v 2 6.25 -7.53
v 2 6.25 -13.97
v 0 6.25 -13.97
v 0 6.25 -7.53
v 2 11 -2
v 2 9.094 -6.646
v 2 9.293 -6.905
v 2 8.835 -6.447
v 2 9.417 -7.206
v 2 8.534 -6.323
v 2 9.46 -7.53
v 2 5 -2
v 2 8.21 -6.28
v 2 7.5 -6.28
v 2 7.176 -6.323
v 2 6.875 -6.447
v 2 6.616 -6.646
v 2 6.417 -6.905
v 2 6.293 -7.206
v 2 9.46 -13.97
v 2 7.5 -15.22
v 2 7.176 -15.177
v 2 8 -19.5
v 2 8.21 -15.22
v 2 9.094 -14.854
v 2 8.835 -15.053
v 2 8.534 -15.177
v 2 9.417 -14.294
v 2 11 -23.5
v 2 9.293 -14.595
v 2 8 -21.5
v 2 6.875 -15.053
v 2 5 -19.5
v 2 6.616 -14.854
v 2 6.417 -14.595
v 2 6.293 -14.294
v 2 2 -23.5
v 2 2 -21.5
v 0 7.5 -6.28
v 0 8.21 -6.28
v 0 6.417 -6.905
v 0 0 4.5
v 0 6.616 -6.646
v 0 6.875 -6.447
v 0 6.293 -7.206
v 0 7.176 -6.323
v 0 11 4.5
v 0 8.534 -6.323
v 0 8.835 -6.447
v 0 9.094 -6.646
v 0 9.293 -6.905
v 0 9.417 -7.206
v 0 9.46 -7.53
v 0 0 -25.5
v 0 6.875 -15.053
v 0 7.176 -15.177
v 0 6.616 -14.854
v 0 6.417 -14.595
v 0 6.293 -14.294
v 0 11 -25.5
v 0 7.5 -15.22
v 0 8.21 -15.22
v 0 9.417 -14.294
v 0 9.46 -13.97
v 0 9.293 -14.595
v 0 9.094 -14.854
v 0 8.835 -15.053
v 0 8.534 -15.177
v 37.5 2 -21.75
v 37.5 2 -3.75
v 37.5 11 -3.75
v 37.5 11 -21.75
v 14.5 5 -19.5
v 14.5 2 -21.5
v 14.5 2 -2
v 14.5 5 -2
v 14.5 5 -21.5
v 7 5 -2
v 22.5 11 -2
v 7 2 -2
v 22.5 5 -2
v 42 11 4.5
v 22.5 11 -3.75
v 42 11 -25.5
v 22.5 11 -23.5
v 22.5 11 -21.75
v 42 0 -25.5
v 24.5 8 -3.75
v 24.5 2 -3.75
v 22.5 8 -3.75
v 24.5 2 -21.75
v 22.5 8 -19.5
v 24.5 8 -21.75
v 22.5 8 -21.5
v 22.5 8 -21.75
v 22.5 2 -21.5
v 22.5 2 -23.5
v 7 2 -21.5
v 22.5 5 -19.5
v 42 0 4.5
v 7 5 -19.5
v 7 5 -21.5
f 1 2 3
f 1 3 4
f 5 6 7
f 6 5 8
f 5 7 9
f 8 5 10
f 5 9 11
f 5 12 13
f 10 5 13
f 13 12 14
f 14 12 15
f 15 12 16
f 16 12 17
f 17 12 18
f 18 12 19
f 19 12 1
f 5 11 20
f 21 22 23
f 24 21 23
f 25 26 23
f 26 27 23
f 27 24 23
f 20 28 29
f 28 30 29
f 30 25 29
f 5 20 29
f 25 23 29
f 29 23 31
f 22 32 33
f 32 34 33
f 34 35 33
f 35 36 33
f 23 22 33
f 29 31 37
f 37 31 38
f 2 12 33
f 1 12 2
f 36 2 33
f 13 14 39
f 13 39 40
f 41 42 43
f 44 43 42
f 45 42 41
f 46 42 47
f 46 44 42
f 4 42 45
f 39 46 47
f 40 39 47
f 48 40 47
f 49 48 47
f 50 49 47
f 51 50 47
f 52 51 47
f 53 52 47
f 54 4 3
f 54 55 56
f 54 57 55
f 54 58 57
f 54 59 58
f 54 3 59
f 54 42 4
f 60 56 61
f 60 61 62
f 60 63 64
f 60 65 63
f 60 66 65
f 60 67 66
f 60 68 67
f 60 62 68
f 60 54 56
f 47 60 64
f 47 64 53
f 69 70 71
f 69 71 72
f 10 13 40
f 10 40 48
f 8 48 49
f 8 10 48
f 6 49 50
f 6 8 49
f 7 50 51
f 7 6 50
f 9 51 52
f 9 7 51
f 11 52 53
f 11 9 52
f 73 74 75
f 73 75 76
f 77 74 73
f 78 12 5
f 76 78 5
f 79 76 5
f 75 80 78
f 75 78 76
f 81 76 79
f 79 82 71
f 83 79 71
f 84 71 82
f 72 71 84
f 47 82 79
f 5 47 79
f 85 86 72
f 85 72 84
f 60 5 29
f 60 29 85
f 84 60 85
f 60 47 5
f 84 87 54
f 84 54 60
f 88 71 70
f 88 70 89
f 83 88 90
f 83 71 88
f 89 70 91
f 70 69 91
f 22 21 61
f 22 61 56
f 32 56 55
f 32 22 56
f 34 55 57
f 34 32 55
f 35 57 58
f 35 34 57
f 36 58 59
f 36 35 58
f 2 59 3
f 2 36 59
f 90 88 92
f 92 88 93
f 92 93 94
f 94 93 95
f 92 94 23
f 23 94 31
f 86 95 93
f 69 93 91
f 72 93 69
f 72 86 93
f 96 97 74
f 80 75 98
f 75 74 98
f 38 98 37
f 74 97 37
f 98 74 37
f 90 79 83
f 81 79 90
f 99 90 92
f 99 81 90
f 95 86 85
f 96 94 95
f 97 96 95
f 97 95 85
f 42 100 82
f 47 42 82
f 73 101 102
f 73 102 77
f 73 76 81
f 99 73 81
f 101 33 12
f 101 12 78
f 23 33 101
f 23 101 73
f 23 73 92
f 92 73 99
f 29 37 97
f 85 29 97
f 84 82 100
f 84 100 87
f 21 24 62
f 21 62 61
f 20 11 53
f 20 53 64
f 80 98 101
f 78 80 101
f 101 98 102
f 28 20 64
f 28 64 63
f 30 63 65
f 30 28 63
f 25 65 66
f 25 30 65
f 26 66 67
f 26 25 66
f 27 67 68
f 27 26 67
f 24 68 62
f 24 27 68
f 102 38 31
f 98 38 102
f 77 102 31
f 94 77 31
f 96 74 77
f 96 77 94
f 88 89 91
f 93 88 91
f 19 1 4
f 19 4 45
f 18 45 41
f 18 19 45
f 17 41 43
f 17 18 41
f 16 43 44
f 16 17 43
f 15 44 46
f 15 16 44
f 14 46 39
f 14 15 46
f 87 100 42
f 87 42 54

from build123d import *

# Parameters (mm, degrees)
BOSS_EXTRUDE1_DEPTH = 2
SKETCH2_W           = 20.5
SKETCH2_H           = 2
SKETCH2_W_2         = 13
SKETCH2_H_2         = 18
SKETCH2_H_3         = 17.5
BOSS_EXTRUDE2_DEPTH = 9
SKETCH3_W           = 5
SKETCH3_H           = 3
SKETCH3_W_2         = 8
BOSS_EXTRUDE4_DEPTH = 17.5
SKETCH6_W           = 7.5
SKETCH6_H           = 3
CUT_EXTRUDE1_DEPTH  = 2.5
CUT_EXTRUDE3_DEPTH  = 3
SKETCH11_W          = 15
SKETCH11_H          = 11
BOSS_EXTRUDE5_DEPTH = 1.75
SKETCH12_W          = 15
SKETCH12_H          = 11
BOSS_EXTRUDE6_DEPTH = 1.75
CUT_EXTRUDE4_DEPTH  = 2
SKETCH14_W          = 39.5
SKETCH14_H          = 11
BOSS_EXTRUDE7_DEPTH = 4.5
SKETCH16_W          = 30
SKETCH16_H          = 11
BOSS_EXTRUDE8_DEPTH = 2.5


with BuildPart() as part:
    # Sketch1 → Boss-Extrude1 (new body)
    with BuildSketch(Plane(origin=(0, 0, 0), x_dir=(1, 0, 0), z_dir=(0, 1, 0))):
        Polygon((0, 25.5), (24.5, 25.5), (24.5, 23.75), (39.5, 23.75), (39.5, 1.75), (24.5, 1.75), (24.5, 0), (0, 0), align=None)
    extrude(amount=BOSS_EXTRUDE1_DEPTH)

    # Sketch2 → Boss-Extrude2 (add)
    with BuildSketch(Plane(origin=(0, 2, 0), x_dir=(1, 0, 0), z_dir=(0, 1, 0))):
        Polygon((24.5, 23.75), (24.5, 25.5), (0, 25.5), (0, 0), (24.5, 0), (24.5, 1.75), (39.5, 1.75), (39.5, 23.75), align=None)
        with Locations((12.25, 22.5)):
            Rectangle(SKETCH2_W, SKETCH2_H, mode=Mode.SUBTRACT)
        with Locations((31, 12.75)):
            Rectangle(SKETCH2_W_2, SKETCH2_H_2, mode=Mode.SUBTRACT)
        with Locations((12.25, 10.75)):
            Rectangle(SKETCH2_W, SKETCH2_H_3, mode=Mode.SUBTRACT)
    extrude(amount=BOSS_EXTRUDE2_DEPTH)

    # Sketch3 → Boss-Extrude4 (add)
    with BuildSketch(Plane.XY.offset(-19.5)):
        with Locations((4.5, 3.5)):
            Rectangle(SKETCH3_W, SKETCH3_H)
        with Locations((18.5, 3.5)):
            Rectangle(SKETCH3_W_2, SKETCH3_H)
    extrude(amount=BOSS_EXTRUDE4_DEPTH)

    # Sketch6 → Cut-Extrude1 (cut)
    with BuildSketch(Plane.XY.offset(-19.5)):
        with Locations((10.75, 3.5)):
            Rectangle(SKETCH6_W, SKETCH6_H)
    extrude(amount=-CUT_EXTRUDE1_DEPTH, mode=Mode.SUBTRACT)

    # Sketch7 → Cut-Extrude3 (cut)
    with BuildSketch(Plane(origin=(0, 11, 0), x_dir=(1, 0, 0), z_dir=(0, 1, 0))):
        Polygon((24.5, 3.75), (22.5, 3.75), (22.5, 19.5), (2, 19.5), (2, 21.5), (22.5, 21.5), (22.5, 21.75), (24.5, 21.75), (24.5, 21.5), (24.5, 19.5), align=None)
    extrude(amount=-CUT_EXTRUDE3_DEPTH, mode=Mode.SUBTRACT)

    # Sketch11 → Boss-Extrude5 (add)
    with BuildSketch(Plane.XY.offset(-1.75)):
        with Locations((32, 5.5)):
            Rectangle(SKETCH11_W, SKETCH11_H)
    extrude(amount=BOSS_EXTRUDE5_DEPTH)

    # Sketch12 → Boss-Extrude6 (add)
    with BuildSketch(Plane(origin=(0, 0, -23.75), x_dir=(-1, 0, 0), z_dir=(0, 0, -1))):
        with Locations((-32, 5.5)):
            Rectangle(SKETCH12_W, SKETCH12_H)
    extrude(amount=BOSS_EXTRUDE6_DEPTH)

    # Sketch13 → Cut-Extrude4 (cut)
    with BuildSketch(Plane(origin=(2, 0, 0), x_dir=(0, 0, -1), z_dir=(1, 0, 0))):
        with BuildLine():
            Line((6.28, 7.5), (6.28, 8.21))
            ThreePointArc((6.28, 8.21), (6.646116524, 9.093883476), (7.53, 9.46))
            Line((7.53, 9.46), (13.97, 9.46))
            ThreePointArc((13.97, 9.46), (14.853883476, 9.093883476), (15.22, 8.21))
            Line((15.22, 8.21), (15.22, 7.5))
            ThreePointArc((15.22, 7.5), (14.853883476, 6.616116524), (13.97, 6.25))
            Line((13.97, 6.25), (7.53, 6.25))
            ThreePointArc((7.53, 6.25), (6.646116524, 6.616116524), (6.28, 7.5))
        make_face()
    extrude(amount=-CUT_EXTRUDE4_DEPTH, mode=Mode.SUBTRACT)

    # Sketch14 → Boss-Extrude7 (add)
    with BuildSketch(Plane.XY):
        with Locations((19.75, 5.5)):
            Rectangle(SKETCH14_W, SKETCH14_H)
    extrude(amount=BOSS_EXTRUDE7_DEPTH)

    # Sketch16 → Boss-Extrude8 (add)
    with BuildSketch(Plane(origin=(39.5, 0, 0), x_dir=(0, 0, -1), z_dir=(1, 0, 0))):
        with Locations((10.5, 5.5)):
            Rectangle(SKETCH16_W, SKETCH16_H)
    extrude(amount=BOSS_EXTRUDE8_DEPTH)


solid = part.part
